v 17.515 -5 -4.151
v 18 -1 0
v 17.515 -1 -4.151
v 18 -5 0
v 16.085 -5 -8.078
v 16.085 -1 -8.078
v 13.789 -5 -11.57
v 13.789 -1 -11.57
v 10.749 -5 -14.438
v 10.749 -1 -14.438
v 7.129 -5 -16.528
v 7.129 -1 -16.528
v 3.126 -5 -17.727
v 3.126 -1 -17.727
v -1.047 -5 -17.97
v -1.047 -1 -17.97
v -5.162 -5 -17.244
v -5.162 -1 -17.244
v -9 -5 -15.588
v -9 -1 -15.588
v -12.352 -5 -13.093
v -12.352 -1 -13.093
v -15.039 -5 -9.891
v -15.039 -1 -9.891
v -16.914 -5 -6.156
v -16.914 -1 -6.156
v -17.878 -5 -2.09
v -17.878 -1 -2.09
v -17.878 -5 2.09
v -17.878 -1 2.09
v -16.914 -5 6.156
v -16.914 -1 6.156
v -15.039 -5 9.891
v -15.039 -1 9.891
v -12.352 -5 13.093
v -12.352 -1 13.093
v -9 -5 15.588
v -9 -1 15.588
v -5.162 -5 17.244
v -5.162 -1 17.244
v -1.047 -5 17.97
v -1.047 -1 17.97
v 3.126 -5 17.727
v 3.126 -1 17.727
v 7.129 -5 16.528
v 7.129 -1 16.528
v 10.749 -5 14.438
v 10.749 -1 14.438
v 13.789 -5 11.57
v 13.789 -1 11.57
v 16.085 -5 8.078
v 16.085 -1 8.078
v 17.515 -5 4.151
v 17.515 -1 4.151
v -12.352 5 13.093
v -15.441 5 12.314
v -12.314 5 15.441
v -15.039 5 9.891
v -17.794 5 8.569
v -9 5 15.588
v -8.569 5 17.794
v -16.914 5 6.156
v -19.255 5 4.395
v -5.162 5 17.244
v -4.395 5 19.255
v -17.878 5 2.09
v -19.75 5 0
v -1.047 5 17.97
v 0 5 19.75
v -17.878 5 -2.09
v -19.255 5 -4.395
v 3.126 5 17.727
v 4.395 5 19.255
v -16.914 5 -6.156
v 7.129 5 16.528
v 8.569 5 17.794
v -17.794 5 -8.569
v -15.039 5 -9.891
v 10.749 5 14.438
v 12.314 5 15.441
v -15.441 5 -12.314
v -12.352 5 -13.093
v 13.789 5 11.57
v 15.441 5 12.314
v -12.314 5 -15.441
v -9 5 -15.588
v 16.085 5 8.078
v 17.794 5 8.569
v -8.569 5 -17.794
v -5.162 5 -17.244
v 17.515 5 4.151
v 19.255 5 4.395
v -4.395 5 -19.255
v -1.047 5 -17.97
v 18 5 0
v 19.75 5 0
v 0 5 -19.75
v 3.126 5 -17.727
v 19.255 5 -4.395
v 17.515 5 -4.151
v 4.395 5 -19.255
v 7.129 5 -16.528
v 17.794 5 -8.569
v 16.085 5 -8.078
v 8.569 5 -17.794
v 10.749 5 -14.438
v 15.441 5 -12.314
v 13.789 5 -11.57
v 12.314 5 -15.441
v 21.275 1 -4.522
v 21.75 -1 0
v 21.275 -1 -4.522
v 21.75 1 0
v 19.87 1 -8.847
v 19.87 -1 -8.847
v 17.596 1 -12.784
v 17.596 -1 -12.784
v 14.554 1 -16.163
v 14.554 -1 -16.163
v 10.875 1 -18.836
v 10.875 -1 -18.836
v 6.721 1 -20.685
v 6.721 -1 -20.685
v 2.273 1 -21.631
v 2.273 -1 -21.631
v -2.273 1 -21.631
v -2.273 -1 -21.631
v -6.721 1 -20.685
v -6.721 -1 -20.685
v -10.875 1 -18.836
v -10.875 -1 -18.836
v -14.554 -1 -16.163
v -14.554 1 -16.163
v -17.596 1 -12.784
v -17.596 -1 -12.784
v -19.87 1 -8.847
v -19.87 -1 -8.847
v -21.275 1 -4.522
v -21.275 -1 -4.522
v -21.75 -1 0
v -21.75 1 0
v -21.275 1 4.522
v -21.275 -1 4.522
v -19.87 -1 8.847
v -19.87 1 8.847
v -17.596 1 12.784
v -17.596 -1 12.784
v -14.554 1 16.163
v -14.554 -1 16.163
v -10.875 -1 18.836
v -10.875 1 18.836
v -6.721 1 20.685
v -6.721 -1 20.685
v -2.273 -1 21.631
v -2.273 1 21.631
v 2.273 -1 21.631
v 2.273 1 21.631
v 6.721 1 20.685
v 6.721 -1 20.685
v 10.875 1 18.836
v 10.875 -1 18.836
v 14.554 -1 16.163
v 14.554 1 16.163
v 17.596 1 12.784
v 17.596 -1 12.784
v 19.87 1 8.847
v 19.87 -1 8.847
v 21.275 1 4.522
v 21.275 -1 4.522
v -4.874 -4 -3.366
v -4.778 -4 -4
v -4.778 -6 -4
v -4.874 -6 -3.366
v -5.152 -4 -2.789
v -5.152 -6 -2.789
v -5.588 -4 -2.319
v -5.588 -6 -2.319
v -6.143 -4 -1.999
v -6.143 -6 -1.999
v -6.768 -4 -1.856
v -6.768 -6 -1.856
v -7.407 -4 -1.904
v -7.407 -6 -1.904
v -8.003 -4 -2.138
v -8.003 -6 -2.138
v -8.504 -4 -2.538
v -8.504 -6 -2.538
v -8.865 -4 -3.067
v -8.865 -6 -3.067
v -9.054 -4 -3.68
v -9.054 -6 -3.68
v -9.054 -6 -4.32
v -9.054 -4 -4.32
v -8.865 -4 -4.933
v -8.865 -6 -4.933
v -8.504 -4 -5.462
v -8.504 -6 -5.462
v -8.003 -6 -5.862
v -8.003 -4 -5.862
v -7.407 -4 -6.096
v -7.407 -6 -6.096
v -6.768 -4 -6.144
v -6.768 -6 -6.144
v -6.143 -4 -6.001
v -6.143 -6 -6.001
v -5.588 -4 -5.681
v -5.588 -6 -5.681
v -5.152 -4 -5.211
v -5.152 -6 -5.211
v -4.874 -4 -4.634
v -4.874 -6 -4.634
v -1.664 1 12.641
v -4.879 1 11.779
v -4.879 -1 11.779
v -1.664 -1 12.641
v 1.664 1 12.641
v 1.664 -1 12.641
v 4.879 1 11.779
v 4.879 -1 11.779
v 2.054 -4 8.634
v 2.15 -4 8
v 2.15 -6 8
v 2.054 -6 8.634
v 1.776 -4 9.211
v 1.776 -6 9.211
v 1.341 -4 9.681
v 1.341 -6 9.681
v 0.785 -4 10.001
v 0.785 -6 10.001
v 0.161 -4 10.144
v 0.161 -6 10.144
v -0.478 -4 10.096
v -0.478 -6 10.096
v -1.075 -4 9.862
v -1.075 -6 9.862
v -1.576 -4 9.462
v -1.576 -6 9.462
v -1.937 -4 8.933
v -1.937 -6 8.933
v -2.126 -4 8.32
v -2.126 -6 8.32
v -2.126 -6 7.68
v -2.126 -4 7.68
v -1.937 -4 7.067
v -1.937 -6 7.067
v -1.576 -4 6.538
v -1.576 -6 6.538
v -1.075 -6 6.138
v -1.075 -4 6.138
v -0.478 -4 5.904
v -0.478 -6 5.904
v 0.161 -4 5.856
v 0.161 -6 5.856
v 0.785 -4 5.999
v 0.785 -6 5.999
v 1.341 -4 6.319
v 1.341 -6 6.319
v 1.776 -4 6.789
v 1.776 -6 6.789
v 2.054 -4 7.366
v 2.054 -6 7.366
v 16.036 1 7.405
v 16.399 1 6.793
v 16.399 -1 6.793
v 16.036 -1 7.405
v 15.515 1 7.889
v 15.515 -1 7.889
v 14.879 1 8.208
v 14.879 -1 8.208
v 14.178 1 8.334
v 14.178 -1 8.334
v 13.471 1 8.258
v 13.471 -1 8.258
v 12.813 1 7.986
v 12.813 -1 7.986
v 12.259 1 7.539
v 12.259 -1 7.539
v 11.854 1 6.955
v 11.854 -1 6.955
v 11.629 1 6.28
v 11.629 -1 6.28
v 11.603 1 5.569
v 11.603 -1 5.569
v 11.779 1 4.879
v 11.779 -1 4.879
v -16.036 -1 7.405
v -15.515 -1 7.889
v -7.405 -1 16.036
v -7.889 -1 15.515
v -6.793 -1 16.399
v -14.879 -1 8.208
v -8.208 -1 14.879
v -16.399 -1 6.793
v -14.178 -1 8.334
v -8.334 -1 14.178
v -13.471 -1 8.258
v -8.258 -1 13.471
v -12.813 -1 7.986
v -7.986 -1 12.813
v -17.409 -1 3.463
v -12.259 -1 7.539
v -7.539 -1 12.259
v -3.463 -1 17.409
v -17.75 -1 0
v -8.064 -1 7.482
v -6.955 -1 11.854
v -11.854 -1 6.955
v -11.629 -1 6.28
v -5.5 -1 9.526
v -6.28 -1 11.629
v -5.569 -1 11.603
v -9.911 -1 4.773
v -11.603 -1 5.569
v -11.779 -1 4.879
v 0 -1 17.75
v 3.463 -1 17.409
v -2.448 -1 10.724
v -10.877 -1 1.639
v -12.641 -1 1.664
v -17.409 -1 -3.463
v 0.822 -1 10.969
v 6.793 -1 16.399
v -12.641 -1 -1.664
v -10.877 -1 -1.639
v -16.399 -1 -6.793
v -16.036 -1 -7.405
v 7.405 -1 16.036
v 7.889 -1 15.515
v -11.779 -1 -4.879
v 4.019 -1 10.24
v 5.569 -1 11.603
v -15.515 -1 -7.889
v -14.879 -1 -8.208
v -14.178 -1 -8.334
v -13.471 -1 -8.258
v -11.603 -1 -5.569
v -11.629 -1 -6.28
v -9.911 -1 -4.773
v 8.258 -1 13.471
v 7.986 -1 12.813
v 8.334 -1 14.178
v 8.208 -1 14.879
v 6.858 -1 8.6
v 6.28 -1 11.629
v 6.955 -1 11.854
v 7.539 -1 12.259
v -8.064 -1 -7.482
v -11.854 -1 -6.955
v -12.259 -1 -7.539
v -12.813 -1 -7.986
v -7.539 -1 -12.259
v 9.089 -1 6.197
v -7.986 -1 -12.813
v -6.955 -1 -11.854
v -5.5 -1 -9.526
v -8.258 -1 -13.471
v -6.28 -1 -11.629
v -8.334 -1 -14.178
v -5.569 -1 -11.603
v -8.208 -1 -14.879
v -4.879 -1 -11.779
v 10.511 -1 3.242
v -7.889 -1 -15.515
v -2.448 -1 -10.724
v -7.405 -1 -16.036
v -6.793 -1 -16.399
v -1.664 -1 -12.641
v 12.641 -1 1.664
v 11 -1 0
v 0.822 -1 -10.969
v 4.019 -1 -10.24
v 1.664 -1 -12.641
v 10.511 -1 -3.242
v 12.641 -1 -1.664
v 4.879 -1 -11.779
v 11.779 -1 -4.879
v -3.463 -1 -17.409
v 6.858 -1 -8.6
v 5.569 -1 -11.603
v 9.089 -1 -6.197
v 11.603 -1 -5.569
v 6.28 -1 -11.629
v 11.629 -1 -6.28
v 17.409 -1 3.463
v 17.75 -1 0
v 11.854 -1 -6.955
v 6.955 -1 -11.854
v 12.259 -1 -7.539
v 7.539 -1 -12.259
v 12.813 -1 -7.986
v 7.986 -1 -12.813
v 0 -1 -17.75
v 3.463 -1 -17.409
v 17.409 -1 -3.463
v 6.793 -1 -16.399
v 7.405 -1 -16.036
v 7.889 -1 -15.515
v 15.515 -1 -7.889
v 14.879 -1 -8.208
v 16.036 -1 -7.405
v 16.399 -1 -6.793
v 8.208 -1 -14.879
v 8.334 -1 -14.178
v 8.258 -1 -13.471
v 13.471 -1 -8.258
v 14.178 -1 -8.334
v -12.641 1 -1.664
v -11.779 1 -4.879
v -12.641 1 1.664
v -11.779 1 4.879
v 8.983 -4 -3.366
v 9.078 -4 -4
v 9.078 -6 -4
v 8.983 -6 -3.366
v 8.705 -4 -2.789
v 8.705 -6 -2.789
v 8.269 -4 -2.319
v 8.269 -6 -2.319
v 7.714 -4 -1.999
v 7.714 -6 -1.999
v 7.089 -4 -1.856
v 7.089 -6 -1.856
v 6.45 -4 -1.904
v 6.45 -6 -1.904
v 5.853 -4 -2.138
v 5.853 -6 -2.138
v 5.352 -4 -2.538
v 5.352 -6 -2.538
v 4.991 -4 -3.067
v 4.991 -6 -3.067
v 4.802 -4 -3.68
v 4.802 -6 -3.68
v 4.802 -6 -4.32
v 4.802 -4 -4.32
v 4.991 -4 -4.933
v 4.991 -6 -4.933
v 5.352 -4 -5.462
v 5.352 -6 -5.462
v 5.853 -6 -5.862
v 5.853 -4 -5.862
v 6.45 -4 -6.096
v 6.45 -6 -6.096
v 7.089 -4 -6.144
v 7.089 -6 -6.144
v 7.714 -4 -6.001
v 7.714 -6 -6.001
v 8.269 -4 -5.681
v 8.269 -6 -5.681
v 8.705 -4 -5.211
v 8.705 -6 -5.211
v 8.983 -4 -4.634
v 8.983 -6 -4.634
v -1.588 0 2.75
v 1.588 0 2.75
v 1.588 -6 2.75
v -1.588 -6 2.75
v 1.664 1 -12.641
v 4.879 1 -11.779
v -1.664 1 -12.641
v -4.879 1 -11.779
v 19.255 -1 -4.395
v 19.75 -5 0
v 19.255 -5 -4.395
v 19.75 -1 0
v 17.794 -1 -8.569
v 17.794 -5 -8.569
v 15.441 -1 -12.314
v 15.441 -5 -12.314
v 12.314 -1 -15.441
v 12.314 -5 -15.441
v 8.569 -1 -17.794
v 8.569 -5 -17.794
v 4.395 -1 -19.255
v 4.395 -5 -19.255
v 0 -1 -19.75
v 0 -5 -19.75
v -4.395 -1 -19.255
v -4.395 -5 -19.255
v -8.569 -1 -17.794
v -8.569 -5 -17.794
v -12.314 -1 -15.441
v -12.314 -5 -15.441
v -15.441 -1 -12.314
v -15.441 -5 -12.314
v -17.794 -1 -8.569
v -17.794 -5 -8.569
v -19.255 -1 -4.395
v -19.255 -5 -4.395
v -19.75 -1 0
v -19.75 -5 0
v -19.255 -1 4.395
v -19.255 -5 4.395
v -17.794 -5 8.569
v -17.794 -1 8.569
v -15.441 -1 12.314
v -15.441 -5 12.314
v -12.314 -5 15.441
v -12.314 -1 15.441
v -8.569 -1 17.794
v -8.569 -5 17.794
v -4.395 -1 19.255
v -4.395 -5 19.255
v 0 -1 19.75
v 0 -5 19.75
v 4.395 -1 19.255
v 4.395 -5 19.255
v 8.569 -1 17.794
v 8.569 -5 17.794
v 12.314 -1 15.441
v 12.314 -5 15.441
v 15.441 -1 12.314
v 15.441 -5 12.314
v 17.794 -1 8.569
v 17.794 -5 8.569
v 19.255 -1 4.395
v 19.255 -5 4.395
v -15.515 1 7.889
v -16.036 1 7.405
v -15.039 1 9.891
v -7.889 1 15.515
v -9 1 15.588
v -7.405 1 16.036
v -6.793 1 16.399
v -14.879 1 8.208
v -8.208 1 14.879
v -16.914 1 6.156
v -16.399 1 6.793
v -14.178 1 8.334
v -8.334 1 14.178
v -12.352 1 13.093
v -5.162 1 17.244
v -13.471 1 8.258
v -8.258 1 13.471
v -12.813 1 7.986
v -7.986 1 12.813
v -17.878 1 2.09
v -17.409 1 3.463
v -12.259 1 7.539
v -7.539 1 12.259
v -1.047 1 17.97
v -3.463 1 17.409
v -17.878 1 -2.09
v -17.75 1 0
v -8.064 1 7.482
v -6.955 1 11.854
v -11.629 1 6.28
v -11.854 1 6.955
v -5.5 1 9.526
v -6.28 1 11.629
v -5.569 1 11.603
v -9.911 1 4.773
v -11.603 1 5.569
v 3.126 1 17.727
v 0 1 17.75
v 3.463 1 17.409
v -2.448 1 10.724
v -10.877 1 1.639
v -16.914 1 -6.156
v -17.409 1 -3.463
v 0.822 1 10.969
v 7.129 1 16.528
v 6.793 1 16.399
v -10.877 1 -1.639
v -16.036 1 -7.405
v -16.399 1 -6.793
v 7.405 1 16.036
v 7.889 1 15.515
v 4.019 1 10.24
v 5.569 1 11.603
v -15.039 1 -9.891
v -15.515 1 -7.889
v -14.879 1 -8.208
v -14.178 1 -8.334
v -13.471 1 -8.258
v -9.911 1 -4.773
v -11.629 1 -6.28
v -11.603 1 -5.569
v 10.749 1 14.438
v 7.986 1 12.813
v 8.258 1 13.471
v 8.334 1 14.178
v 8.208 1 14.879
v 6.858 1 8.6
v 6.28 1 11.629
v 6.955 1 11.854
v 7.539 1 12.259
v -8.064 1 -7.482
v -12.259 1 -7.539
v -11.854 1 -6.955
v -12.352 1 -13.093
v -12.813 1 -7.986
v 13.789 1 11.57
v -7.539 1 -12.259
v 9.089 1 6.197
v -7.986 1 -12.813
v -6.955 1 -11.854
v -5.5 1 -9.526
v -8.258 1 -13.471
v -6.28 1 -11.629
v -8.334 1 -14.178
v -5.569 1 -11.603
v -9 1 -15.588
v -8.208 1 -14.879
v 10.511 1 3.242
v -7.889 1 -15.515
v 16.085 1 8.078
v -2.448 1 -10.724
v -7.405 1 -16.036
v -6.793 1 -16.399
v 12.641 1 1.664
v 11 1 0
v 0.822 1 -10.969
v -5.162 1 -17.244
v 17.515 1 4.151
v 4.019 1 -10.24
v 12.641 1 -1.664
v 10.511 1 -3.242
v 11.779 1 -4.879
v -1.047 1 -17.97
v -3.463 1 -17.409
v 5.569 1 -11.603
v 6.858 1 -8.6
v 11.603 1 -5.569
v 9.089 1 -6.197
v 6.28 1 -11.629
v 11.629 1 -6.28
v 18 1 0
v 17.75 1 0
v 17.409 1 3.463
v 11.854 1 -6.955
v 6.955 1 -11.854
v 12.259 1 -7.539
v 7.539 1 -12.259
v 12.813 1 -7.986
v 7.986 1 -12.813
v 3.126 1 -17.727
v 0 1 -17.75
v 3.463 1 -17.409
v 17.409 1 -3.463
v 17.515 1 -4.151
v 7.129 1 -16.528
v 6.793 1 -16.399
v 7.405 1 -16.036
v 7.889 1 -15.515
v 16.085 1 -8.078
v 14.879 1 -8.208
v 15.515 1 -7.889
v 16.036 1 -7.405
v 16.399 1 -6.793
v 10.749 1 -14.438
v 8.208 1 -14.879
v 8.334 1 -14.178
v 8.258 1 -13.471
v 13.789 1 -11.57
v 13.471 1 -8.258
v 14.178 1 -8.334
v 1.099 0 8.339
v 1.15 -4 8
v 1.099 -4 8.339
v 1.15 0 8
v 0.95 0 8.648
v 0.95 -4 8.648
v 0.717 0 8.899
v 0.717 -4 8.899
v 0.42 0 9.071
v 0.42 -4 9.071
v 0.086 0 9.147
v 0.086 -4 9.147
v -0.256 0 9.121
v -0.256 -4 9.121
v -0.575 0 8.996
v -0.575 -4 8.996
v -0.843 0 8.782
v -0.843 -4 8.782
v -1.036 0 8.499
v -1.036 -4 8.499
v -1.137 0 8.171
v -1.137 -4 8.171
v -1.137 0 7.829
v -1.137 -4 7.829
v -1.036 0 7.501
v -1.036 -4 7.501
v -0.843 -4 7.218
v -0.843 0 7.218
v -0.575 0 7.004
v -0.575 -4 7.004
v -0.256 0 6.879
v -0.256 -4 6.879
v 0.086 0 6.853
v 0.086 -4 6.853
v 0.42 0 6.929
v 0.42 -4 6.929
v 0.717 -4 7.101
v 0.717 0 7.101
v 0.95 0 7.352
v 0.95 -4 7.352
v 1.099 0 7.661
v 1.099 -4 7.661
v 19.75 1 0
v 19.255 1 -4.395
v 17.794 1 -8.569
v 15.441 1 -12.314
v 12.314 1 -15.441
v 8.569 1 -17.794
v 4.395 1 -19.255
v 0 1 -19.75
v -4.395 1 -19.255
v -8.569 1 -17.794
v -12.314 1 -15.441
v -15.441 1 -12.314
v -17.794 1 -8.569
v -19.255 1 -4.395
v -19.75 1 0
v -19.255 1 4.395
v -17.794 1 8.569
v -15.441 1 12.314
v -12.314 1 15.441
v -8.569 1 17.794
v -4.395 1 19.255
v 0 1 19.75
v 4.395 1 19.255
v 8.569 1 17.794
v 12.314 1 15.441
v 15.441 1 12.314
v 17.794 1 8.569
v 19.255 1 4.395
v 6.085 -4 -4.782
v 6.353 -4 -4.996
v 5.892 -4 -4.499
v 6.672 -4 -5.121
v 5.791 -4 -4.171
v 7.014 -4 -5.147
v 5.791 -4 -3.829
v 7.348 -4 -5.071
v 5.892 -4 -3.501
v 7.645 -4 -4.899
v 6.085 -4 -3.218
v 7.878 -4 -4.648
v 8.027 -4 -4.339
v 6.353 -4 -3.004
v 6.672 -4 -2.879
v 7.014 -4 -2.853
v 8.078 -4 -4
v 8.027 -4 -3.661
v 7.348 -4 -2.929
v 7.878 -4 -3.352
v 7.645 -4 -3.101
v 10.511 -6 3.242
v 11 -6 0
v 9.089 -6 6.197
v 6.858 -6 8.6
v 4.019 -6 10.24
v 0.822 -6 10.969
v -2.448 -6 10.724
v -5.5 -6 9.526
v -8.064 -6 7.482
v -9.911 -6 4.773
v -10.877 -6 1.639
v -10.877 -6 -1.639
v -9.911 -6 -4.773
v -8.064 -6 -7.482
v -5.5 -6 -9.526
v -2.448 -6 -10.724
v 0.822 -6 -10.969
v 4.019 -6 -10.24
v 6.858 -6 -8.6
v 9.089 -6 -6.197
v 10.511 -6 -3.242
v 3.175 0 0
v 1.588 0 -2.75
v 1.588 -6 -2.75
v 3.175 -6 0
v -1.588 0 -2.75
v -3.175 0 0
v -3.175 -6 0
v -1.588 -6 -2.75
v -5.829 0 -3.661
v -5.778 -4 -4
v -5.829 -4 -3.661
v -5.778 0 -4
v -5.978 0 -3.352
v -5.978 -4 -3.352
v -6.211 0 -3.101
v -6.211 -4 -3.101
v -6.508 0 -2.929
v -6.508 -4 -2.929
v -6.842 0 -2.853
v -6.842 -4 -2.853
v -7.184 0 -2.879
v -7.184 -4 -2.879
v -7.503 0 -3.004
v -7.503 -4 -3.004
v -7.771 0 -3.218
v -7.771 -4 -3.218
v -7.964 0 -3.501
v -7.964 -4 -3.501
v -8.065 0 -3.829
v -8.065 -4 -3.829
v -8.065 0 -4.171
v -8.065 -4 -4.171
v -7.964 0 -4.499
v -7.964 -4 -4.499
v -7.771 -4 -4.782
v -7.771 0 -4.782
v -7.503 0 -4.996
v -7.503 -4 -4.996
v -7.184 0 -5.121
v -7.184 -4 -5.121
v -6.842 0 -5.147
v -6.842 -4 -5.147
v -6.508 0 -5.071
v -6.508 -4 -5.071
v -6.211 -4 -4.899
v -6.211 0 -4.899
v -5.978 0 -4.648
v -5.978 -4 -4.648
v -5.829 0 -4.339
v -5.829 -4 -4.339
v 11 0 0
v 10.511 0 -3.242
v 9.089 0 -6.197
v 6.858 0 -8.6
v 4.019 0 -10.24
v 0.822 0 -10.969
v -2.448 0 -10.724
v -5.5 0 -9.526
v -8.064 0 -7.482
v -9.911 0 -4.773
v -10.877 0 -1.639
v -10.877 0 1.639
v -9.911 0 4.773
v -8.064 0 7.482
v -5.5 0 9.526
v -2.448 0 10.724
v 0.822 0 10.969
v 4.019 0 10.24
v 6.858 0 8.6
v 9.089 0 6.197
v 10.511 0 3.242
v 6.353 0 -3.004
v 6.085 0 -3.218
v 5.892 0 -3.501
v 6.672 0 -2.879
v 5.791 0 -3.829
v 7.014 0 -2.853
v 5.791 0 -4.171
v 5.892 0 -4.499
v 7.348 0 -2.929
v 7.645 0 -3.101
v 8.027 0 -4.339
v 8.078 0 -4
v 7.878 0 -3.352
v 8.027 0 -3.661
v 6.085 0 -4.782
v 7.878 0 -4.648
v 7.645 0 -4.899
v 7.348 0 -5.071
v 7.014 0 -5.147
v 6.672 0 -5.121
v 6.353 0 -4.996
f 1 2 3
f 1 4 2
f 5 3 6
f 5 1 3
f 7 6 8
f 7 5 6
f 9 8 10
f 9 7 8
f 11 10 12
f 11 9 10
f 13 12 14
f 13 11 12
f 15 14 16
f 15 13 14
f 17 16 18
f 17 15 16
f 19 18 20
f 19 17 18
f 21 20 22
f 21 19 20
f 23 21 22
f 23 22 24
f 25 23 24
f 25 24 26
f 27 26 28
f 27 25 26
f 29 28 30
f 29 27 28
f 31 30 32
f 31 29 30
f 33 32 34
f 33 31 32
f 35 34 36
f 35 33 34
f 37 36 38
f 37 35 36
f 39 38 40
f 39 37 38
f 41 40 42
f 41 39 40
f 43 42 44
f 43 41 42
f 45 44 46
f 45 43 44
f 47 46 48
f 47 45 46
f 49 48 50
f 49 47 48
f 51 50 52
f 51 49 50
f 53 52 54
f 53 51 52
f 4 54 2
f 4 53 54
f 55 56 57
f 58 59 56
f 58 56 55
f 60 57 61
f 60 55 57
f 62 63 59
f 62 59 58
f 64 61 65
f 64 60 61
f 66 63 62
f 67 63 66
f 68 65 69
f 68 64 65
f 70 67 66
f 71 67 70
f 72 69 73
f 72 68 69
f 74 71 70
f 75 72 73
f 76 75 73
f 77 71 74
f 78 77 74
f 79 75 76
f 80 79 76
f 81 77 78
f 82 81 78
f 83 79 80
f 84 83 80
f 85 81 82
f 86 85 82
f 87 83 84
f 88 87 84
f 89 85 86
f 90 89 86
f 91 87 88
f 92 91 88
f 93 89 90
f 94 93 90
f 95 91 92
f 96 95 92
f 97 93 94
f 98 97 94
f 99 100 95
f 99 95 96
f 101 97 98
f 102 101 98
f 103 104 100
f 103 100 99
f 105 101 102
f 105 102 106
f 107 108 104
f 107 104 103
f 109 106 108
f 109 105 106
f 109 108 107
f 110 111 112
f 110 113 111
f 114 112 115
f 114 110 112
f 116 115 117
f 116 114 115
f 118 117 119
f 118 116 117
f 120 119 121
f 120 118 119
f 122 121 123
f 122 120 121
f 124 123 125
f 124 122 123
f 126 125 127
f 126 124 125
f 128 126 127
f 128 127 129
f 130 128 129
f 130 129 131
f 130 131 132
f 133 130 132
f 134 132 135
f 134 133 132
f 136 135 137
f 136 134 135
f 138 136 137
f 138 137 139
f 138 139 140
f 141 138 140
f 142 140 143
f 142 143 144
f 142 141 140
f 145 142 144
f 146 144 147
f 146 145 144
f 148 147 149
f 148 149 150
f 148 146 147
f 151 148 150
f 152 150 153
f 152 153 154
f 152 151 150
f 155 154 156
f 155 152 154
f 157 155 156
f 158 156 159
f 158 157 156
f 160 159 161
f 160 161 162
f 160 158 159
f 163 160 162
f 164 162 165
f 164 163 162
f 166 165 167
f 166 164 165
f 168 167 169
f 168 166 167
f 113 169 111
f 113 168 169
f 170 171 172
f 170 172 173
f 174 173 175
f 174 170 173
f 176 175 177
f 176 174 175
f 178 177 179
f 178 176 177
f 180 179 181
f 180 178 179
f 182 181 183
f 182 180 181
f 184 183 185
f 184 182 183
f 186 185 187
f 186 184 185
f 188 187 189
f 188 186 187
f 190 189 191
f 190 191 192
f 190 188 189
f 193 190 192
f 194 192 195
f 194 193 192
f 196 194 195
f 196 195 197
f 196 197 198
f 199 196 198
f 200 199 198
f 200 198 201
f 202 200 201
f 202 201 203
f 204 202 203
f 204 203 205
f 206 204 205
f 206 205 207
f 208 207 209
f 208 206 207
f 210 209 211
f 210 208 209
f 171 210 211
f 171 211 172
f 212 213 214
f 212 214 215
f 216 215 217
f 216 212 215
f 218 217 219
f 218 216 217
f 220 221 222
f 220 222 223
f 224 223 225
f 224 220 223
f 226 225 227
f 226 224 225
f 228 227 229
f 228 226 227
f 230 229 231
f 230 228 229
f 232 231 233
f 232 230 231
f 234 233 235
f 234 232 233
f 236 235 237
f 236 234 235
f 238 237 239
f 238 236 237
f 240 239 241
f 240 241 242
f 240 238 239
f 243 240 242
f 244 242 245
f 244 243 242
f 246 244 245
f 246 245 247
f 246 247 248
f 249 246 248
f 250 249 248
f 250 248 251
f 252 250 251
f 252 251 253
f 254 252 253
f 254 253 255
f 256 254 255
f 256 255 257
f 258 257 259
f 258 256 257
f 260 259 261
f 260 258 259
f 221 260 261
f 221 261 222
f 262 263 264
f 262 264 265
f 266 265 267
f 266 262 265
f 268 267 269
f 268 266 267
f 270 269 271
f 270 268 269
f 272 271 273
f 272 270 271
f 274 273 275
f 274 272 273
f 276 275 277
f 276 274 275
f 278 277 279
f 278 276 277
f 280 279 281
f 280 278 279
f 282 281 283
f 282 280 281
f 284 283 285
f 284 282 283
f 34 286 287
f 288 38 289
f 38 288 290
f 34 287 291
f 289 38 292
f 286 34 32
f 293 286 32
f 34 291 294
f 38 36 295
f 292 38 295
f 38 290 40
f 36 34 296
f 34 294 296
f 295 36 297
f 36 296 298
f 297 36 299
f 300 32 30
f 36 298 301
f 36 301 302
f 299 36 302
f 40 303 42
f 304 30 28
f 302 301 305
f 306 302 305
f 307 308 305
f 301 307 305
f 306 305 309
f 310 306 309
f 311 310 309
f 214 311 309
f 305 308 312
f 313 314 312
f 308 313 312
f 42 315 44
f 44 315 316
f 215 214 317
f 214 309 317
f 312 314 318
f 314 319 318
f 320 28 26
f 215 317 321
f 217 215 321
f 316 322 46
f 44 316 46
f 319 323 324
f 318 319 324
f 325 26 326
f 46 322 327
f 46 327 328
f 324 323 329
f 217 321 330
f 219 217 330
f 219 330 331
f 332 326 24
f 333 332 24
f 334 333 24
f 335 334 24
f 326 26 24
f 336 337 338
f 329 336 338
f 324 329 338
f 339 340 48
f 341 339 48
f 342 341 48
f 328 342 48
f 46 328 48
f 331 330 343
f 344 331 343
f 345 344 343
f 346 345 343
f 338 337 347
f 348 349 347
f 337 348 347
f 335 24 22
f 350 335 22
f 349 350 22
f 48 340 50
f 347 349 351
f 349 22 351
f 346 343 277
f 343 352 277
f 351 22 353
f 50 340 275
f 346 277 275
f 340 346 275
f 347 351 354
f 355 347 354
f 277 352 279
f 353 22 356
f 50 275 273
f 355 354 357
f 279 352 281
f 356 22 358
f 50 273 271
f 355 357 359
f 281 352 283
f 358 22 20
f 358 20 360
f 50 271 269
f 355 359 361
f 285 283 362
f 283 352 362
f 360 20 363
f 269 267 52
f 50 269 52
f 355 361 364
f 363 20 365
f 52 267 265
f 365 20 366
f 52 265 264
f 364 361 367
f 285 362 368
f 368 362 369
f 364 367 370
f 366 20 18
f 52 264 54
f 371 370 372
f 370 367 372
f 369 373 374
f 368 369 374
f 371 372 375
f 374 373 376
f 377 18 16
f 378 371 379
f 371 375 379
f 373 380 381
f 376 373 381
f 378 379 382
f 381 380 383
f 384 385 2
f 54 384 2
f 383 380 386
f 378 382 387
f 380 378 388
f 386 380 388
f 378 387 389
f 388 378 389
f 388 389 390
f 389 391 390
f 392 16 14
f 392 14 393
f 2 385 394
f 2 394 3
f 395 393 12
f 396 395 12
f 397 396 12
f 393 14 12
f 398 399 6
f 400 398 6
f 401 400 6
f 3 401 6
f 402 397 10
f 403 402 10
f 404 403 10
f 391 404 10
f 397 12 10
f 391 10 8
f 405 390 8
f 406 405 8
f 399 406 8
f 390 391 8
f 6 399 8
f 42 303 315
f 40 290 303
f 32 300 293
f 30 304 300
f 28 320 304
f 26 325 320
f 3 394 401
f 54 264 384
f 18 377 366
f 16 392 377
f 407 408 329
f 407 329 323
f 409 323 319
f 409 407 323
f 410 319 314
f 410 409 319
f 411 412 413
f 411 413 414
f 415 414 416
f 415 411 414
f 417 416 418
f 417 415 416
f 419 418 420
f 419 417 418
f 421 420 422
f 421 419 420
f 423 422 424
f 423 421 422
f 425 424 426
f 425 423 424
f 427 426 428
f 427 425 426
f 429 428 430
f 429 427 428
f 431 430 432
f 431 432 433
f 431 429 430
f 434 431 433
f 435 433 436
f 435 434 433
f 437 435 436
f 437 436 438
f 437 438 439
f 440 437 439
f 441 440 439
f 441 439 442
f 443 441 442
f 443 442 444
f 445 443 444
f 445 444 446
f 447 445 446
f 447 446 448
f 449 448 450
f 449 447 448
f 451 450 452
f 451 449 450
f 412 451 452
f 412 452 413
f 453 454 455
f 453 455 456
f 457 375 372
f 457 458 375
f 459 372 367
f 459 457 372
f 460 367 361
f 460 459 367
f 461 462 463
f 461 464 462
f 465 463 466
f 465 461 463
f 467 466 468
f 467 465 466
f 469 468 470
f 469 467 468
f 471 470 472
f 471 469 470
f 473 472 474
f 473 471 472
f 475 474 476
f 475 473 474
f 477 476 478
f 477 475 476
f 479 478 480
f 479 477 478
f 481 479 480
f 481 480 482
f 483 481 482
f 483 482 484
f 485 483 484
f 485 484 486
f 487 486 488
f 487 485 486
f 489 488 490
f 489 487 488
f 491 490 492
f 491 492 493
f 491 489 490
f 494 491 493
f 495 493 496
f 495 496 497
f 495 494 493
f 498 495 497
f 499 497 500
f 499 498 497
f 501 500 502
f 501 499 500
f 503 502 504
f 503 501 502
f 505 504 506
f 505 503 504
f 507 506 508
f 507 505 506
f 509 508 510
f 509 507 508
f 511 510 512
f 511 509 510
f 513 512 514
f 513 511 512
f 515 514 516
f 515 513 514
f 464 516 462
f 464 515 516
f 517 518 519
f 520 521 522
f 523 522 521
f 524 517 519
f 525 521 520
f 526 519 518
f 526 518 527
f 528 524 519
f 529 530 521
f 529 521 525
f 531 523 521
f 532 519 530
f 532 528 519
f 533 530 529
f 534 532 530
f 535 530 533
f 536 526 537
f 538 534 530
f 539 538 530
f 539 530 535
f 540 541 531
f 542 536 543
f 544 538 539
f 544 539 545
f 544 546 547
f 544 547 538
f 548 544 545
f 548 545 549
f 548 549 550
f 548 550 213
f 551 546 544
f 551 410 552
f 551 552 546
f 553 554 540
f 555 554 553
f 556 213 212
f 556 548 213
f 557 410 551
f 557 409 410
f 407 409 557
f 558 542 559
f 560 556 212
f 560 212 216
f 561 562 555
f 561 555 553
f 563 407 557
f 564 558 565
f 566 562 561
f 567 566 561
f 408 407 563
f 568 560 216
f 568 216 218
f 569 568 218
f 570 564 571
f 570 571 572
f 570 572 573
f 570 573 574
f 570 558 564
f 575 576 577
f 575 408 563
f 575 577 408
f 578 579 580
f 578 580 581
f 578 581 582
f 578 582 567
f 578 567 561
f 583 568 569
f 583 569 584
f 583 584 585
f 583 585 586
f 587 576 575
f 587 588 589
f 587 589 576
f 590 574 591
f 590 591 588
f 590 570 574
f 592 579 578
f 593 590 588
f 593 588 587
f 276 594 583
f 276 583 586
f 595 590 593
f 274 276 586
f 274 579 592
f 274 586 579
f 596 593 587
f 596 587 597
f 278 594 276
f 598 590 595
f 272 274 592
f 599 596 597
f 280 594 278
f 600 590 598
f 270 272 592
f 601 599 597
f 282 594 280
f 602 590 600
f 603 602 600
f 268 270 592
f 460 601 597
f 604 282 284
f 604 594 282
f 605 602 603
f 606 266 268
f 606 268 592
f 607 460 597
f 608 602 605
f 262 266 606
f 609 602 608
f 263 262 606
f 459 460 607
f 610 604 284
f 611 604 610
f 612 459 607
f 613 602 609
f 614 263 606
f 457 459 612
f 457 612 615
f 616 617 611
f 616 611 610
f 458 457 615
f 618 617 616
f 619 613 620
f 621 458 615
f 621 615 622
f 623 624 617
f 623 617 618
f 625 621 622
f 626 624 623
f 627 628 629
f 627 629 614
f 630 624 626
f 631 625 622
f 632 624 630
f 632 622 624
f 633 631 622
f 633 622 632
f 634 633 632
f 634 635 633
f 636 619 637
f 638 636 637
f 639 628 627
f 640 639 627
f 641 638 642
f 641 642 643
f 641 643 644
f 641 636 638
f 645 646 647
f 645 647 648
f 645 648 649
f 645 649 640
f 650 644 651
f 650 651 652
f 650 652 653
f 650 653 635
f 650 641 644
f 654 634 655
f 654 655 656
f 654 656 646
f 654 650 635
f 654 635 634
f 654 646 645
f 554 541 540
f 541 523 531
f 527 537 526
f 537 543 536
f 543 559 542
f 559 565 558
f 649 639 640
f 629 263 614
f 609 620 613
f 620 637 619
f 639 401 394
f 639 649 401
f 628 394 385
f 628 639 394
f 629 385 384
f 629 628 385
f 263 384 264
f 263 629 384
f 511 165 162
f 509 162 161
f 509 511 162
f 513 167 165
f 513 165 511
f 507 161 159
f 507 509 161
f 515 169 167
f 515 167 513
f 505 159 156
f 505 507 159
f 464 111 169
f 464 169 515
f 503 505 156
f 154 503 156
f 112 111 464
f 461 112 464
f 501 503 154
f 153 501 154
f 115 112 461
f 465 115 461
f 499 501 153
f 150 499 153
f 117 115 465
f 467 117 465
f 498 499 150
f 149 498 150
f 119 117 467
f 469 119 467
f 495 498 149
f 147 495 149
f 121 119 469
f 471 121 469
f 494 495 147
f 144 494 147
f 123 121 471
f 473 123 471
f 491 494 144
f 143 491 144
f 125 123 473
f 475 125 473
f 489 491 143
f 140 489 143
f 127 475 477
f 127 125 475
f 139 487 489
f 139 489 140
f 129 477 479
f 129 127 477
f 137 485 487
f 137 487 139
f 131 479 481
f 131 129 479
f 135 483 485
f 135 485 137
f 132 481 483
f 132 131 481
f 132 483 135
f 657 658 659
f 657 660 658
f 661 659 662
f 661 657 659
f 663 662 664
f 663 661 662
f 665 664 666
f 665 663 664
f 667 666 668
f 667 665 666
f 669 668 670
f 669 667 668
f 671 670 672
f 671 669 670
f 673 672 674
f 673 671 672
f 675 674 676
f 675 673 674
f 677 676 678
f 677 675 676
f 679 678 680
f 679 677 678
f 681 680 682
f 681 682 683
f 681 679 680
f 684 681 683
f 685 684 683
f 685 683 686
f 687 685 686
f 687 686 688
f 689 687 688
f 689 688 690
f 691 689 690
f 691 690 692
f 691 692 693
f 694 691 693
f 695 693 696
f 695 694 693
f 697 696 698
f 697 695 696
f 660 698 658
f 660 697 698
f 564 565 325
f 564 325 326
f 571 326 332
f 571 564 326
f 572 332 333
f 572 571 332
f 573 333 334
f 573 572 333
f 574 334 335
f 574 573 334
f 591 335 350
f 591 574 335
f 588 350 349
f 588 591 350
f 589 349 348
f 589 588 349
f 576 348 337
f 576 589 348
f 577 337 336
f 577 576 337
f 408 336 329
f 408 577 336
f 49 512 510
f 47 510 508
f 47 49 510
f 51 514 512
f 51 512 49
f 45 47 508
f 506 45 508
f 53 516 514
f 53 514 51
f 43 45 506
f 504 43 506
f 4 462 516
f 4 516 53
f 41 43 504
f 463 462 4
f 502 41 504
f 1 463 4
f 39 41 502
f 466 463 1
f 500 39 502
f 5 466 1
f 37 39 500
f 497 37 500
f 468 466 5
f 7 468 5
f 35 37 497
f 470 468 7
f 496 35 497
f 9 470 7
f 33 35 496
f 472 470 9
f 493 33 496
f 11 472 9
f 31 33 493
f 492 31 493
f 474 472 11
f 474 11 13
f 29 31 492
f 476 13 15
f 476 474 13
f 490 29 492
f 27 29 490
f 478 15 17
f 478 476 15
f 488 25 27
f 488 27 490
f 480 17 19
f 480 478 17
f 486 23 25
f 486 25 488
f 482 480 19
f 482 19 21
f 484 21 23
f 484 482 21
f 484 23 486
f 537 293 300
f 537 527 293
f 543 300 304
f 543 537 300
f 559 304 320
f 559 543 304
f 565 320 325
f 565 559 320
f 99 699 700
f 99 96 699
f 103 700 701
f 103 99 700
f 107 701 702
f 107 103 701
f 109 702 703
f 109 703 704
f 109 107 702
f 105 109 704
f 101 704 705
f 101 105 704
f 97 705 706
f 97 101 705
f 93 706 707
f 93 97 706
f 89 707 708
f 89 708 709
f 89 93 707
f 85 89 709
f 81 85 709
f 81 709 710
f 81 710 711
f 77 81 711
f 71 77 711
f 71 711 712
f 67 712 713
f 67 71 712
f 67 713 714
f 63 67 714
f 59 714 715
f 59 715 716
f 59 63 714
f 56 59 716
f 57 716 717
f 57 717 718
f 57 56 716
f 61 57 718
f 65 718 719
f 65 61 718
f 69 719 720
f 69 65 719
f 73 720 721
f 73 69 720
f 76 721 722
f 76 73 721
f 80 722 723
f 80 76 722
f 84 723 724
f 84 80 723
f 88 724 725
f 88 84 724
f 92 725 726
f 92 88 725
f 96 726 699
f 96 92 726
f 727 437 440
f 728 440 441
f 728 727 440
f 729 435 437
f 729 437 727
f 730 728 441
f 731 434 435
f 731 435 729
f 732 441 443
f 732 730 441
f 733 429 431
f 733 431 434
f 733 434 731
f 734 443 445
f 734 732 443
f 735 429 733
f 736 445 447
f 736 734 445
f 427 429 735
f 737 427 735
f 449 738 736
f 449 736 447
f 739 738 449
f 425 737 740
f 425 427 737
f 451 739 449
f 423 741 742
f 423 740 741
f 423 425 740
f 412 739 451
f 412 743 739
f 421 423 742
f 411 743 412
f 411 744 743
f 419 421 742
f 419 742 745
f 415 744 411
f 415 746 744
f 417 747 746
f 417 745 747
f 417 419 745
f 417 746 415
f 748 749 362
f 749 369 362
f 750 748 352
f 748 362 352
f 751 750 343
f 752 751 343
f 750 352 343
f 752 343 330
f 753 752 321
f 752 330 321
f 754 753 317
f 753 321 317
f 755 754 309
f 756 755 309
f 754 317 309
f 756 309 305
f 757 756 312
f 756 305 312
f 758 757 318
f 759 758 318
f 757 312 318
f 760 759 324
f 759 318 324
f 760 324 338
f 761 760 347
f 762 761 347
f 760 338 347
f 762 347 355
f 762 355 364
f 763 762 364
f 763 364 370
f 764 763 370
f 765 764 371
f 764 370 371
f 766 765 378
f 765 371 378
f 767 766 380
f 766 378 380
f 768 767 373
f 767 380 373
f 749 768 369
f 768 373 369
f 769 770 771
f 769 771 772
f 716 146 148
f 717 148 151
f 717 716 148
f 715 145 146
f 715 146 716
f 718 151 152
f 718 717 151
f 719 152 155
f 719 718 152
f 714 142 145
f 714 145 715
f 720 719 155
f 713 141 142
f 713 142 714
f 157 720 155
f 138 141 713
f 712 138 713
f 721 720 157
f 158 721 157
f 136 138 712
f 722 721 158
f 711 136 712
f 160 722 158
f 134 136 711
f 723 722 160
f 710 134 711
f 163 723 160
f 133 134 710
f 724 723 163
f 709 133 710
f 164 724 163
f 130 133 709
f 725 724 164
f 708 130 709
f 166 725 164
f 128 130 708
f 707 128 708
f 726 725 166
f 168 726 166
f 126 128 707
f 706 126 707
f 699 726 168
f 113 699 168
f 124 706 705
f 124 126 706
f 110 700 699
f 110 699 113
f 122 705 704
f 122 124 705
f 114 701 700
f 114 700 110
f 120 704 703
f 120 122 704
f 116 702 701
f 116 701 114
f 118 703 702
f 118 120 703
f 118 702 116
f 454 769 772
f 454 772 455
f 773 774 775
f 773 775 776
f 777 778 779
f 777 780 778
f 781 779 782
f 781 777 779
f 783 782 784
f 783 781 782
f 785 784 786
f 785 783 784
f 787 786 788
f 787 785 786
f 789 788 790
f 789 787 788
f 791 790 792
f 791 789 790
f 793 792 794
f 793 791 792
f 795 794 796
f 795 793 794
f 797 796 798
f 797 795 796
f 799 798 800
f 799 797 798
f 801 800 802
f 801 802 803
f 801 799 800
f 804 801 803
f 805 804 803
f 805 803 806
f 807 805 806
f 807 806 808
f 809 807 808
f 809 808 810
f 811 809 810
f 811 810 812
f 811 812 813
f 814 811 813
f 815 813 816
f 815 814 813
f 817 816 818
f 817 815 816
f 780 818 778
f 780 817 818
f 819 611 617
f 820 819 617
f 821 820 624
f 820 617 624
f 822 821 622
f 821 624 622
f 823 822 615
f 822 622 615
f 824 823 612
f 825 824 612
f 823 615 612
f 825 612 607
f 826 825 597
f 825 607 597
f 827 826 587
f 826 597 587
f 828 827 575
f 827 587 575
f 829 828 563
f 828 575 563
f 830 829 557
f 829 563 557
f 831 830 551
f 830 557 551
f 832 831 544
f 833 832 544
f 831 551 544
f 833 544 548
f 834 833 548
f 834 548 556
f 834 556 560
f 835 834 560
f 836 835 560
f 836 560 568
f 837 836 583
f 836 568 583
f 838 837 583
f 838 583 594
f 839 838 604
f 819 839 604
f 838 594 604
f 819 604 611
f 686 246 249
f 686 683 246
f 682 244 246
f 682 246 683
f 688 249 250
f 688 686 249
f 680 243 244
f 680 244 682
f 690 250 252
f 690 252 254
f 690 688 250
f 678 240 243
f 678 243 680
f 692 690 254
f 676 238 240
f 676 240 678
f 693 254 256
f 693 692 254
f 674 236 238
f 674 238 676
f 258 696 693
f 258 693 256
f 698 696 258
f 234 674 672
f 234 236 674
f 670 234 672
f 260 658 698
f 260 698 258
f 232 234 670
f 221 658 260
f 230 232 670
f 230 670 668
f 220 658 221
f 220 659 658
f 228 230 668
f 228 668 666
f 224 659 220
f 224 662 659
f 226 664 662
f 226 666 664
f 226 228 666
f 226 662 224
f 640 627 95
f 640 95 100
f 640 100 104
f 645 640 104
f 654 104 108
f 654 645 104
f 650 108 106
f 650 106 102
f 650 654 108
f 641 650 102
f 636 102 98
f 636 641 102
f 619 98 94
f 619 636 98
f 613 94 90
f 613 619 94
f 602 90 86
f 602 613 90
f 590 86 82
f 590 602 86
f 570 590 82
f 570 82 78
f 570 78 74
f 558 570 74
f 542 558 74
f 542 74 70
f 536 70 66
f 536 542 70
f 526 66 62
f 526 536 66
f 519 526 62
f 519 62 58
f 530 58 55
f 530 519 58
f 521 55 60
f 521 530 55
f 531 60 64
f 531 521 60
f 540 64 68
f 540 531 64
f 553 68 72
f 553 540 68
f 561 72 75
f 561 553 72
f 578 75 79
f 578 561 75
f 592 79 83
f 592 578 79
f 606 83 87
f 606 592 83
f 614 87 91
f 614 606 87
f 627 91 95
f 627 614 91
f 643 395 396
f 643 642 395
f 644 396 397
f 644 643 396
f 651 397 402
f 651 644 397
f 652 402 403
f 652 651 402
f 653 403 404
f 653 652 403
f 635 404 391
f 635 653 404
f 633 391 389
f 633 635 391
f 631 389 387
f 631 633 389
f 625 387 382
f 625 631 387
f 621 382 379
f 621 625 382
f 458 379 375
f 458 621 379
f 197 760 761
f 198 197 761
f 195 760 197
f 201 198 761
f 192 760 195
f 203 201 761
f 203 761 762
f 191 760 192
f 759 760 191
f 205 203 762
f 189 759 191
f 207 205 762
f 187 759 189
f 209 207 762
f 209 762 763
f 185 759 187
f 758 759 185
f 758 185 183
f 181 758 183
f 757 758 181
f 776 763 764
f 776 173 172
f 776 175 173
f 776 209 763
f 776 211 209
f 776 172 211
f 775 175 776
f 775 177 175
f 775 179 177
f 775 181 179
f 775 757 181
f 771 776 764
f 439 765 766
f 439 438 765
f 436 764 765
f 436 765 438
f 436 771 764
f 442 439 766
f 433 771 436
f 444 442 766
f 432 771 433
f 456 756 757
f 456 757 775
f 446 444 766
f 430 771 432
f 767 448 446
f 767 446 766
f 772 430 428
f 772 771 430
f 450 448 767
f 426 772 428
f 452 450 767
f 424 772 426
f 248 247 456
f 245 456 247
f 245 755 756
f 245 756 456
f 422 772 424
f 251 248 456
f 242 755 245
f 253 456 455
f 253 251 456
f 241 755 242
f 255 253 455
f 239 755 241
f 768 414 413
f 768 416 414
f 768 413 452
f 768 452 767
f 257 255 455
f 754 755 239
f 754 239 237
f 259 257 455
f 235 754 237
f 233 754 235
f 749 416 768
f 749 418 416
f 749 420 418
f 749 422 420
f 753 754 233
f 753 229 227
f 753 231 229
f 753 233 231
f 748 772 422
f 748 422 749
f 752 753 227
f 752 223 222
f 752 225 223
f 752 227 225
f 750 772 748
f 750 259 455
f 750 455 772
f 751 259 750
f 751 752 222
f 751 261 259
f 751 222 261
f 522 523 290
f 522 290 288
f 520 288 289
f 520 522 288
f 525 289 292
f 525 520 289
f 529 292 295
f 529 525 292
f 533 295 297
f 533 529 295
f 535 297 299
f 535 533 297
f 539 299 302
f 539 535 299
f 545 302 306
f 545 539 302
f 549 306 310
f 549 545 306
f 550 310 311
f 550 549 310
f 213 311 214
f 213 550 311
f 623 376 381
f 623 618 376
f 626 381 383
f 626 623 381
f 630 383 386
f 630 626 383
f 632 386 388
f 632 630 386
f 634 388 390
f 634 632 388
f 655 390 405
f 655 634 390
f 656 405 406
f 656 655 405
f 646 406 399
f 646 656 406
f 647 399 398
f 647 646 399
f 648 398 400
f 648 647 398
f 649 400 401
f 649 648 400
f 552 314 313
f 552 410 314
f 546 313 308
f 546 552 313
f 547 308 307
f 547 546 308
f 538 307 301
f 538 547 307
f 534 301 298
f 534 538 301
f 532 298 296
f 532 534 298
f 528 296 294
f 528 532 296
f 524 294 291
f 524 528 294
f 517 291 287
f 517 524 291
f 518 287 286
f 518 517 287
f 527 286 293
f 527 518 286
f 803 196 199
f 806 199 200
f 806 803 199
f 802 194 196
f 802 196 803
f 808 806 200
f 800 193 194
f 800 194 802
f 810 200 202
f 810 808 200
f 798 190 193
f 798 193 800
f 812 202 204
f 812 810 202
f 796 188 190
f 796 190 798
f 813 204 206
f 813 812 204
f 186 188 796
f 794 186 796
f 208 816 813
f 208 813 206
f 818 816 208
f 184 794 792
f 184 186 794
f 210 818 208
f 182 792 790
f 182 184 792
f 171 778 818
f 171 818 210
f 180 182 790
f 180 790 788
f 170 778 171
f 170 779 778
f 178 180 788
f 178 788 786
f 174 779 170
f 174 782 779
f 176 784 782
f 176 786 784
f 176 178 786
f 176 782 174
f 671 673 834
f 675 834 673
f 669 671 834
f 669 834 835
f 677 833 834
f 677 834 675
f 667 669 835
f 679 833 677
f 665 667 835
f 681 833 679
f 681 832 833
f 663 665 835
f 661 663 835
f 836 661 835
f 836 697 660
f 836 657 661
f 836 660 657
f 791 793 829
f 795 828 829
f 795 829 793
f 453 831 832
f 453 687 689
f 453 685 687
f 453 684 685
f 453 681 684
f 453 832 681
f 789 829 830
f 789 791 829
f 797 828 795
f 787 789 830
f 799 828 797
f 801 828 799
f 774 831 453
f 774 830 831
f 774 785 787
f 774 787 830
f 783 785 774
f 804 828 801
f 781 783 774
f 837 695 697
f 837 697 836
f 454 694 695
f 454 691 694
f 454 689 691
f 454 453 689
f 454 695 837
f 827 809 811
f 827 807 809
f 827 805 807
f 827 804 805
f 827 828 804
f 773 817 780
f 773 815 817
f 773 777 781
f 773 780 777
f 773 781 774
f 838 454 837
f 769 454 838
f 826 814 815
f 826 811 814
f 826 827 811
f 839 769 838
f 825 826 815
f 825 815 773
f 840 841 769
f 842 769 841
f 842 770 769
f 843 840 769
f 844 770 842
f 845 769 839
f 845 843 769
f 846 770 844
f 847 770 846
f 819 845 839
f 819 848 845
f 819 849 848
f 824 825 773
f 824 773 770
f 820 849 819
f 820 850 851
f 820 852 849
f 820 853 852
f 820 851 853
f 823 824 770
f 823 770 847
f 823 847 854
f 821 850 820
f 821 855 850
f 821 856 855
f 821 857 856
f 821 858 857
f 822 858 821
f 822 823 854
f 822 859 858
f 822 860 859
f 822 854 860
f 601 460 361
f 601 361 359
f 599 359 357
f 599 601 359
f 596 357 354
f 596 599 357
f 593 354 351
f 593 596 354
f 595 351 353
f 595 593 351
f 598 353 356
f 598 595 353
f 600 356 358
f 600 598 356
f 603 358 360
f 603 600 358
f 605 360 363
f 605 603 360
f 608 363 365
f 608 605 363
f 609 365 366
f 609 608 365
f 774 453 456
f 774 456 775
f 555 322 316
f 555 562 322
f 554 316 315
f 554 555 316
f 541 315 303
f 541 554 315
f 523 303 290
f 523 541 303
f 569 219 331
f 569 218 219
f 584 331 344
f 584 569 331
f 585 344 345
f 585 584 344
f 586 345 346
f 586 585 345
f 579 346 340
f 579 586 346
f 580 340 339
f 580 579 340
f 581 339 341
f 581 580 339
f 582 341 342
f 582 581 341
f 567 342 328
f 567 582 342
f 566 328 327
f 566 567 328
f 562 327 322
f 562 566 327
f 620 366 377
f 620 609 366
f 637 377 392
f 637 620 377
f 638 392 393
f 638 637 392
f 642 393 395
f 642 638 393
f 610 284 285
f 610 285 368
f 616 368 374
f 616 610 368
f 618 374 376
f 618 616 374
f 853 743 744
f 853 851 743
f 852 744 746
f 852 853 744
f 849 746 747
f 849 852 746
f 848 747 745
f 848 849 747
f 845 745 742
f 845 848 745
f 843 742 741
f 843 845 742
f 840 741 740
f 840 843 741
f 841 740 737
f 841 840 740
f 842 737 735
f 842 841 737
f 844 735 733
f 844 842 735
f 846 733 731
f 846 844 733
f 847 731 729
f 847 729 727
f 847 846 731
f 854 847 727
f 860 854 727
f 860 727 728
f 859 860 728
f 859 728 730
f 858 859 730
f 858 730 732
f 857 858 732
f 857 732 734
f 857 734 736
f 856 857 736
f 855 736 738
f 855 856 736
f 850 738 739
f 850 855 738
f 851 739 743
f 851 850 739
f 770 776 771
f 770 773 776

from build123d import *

# Parameters (mm, degrees)
SKETCH3_R           = 18
BOSS_EXTRUDE1_DEPTH = 1
SKETCH4_R           = 11
CUT_EXTRUDE1_DEPTH  = 1
SKETCH5_R           = 1.15
CUT_EXTRUDE2_DEPTH  = 6
SKETCH6_R           = 11
SKETCH6_R_2         = 1.15
BOSS_EXTRUDE2_DEPTH = 3
SKETCH9_R           = 11
SKETCH9_R_2         = 2.15
BOSS_EXTRUDE3_DEPTH = 2


with BuildPart() as part:
    # Sketch1 → Revolve1 (revolve)
    with BuildSketch(Plane.XY):
        Polygon((18, 5), (18, -5), (19.75, -5), (19.75, -1), (21.75, -1), (21.75, 1), (19.75, 1), (19.75, 5), align=None)
    revolve(axis=Axis((0, 0, 0), (0, 1, 0)))

    # Sketch3 → Boss-Extrude1 (add, symmetric)
    with BuildSketch(Plane(origin=(0, 0, 0), x_dir=(1, 0, 0), z_dir=(0, 1, 0))):
        Circle(SKETCH3_R)
        with BuildLine():
            ThreePointArc((-6.792630924, -16.398861702), (-8.145621175, -13.13245429), (-4.879213763, -11.77946404))
            ThreePointArc((-4.879213763, -11.77946404), (0, -12.75), (4.879213763, -11.77946404))
            ThreePointArc((4.879213763, -11.77946404), (8.145621175, -13.13245429), (6.792630924, -16.398861702))
            ThreePointArc((6.792630924, -16.398861702), (0, -17.75), (-6.792630924, -16.398861702))
        make_face(mode=Mode.SUBTRACT)
        with BuildLine():
            ThreePointArc((16.398861702, -6.792630924), (13.13245429, -8.145621175), (11.77946404, -4.879213763))
            ThreePointArc((11.77946404, -4.879213763), (12.75, 0), (11.77946404, 4.879213763))
            ThreePointArc((11.77946404, 4.879213763), (13.13245429, 8.145621175), (16.398861702, 6.792630924))
            ThreePointArc((16.398861702, 6.792630924), (17.75, 0), (16.398861702, -6.792630924))
        make_face(mode=Mode.SUBTRACT)
        with BuildLine():
            ThreePointArc((-16.398861702, 6.792630924), (-13.13245429, 8.145621175), (-11.77946404, 4.879213763))
            ThreePointArc((-11.77946404, 4.879213763), (-12.75, 0), (-11.77946404, -4.879213763))
            ThreePointArc((-11.77946404, -4.879213763), (-13.13245429, -8.145621175), (-16.398861702, -6.792630924))
            ThreePointArc((-16.398861702, -6.792630924), (-17.75, 0), (-16.398861702, 6.792630924))
        make_face(mode=Mode.SUBTRACT)
        with BuildLine():
            ThreePointArc((-4.879213763, 11.77946404), (-8.145621175, 13.13245429), (-6.792630924, 16.398861702))
            ThreePointArc((-6.792630924, 16.398861702), (0, 17.75), (6.792630924, 16.398861702))
            ThreePointArc((6.792630924, 16.398861702), (8.145621175, 13.13245429), (4.879213763, 11.77946404))
            ThreePointArc((4.879213763, 11.77946404), (0, 12.75), (-4.879213763, 11.77946404))
        make_face(mode=Mode.SUBTRACT)
    extrude(amount=BOSS_EXTRUDE1_DEPTH, both=True)

    # Sketch4 → Cut-Extrude1 (cut)
    with BuildSketch(Plane(origin=(0, 1, 0), x_dir=(1, 0, 0), z_dir=(0, 1, 0))):
        Circle(SKETCH4_R)
    extrude(amount=-CUT_EXTRUDE1_DEPTH, mode=Mode.SUBTRACT)

    # Sketch5 → Cut-Extrude2 (cut, through all)
    with BuildSketch(Plane(origin=(0, 0, 0), x_dir=(1, 0, 0), z_dir=(0, 1, 0))):
        with Locations((0, -8)):
            Circle(SKETCH5_R)
        with Locations((-6.92820323, 4)):
            Circle(SKETCH5_R)
        with Locations((6.92820323, 4)):
            Circle(SKETCH5_R)
        Polygon((3.175426481, 0), (1.58771324, 2.75), (-1.58771324, 2.75), (-3.175426481, 0), (-1.58771324, -2.75), (1.58771324, -2.75), align=None)
    extrude(amount=-CUT_EXTRUDE2_DEPTH, mode=Mode.SUBTRACT)

    # Sketch6 → Boss-Extrude2 (add)
    with BuildSketch(Plane.XZ.offset(1)):
        Circle(SKETCH6_R)
        with Locations((-6.92820323, -4)):
            Circle(SKETCH6_R_2, mode=Mode.SUBTRACT)
        with Locations((6.92820323, -4)):
            Circle(SKETCH6_R_2, mode=Mode.SUBTRACT)
        with Locations((0, 8)):
            Circle(SKETCH6_R_2, mode=Mode.SUBTRACT)
        Polygon((3.175426481, 0), (1.58771324, -2.75), (-1.58771324, -2.75), (-3.175426481, 0), (-1.58771324, 2.75), (1.58771324, 2.75), align=None, mode=Mode.SUBTRACT)
    extrude(amount=BOSS_EXTRUDE2_DEPTH)

    # Sketch9 → Boss-Extrude3 (add)
    with BuildSketch(Plane.XZ.offset(4)):
        Circle(SKETCH9_R)
        with Locations((0, 8)):
            Circle(SKETCH9_R_2, mode=Mode.SUBTRACT)
        with Locations((-6.92820323, -4)):
            Circle(SKETCH9_R_2, mode=Mode.SUBTRACT)
        with Locations((6.92820323, -4)):
            Circle(SKETCH9_R_2, mode=Mode.SUBTRACT)
        Polygon((-1.58771324, -2.75), (1.58771324, -2.75), (3.175426481, 0), (1.58771324, 2.75), (-1.58771324, 2.75), (-3.175426481, 0), align=None, mode=Mode.SUBTRACT)
    extrude(amount=BOSS_EXTRUDE3_DEPTH)


solid = part.part
